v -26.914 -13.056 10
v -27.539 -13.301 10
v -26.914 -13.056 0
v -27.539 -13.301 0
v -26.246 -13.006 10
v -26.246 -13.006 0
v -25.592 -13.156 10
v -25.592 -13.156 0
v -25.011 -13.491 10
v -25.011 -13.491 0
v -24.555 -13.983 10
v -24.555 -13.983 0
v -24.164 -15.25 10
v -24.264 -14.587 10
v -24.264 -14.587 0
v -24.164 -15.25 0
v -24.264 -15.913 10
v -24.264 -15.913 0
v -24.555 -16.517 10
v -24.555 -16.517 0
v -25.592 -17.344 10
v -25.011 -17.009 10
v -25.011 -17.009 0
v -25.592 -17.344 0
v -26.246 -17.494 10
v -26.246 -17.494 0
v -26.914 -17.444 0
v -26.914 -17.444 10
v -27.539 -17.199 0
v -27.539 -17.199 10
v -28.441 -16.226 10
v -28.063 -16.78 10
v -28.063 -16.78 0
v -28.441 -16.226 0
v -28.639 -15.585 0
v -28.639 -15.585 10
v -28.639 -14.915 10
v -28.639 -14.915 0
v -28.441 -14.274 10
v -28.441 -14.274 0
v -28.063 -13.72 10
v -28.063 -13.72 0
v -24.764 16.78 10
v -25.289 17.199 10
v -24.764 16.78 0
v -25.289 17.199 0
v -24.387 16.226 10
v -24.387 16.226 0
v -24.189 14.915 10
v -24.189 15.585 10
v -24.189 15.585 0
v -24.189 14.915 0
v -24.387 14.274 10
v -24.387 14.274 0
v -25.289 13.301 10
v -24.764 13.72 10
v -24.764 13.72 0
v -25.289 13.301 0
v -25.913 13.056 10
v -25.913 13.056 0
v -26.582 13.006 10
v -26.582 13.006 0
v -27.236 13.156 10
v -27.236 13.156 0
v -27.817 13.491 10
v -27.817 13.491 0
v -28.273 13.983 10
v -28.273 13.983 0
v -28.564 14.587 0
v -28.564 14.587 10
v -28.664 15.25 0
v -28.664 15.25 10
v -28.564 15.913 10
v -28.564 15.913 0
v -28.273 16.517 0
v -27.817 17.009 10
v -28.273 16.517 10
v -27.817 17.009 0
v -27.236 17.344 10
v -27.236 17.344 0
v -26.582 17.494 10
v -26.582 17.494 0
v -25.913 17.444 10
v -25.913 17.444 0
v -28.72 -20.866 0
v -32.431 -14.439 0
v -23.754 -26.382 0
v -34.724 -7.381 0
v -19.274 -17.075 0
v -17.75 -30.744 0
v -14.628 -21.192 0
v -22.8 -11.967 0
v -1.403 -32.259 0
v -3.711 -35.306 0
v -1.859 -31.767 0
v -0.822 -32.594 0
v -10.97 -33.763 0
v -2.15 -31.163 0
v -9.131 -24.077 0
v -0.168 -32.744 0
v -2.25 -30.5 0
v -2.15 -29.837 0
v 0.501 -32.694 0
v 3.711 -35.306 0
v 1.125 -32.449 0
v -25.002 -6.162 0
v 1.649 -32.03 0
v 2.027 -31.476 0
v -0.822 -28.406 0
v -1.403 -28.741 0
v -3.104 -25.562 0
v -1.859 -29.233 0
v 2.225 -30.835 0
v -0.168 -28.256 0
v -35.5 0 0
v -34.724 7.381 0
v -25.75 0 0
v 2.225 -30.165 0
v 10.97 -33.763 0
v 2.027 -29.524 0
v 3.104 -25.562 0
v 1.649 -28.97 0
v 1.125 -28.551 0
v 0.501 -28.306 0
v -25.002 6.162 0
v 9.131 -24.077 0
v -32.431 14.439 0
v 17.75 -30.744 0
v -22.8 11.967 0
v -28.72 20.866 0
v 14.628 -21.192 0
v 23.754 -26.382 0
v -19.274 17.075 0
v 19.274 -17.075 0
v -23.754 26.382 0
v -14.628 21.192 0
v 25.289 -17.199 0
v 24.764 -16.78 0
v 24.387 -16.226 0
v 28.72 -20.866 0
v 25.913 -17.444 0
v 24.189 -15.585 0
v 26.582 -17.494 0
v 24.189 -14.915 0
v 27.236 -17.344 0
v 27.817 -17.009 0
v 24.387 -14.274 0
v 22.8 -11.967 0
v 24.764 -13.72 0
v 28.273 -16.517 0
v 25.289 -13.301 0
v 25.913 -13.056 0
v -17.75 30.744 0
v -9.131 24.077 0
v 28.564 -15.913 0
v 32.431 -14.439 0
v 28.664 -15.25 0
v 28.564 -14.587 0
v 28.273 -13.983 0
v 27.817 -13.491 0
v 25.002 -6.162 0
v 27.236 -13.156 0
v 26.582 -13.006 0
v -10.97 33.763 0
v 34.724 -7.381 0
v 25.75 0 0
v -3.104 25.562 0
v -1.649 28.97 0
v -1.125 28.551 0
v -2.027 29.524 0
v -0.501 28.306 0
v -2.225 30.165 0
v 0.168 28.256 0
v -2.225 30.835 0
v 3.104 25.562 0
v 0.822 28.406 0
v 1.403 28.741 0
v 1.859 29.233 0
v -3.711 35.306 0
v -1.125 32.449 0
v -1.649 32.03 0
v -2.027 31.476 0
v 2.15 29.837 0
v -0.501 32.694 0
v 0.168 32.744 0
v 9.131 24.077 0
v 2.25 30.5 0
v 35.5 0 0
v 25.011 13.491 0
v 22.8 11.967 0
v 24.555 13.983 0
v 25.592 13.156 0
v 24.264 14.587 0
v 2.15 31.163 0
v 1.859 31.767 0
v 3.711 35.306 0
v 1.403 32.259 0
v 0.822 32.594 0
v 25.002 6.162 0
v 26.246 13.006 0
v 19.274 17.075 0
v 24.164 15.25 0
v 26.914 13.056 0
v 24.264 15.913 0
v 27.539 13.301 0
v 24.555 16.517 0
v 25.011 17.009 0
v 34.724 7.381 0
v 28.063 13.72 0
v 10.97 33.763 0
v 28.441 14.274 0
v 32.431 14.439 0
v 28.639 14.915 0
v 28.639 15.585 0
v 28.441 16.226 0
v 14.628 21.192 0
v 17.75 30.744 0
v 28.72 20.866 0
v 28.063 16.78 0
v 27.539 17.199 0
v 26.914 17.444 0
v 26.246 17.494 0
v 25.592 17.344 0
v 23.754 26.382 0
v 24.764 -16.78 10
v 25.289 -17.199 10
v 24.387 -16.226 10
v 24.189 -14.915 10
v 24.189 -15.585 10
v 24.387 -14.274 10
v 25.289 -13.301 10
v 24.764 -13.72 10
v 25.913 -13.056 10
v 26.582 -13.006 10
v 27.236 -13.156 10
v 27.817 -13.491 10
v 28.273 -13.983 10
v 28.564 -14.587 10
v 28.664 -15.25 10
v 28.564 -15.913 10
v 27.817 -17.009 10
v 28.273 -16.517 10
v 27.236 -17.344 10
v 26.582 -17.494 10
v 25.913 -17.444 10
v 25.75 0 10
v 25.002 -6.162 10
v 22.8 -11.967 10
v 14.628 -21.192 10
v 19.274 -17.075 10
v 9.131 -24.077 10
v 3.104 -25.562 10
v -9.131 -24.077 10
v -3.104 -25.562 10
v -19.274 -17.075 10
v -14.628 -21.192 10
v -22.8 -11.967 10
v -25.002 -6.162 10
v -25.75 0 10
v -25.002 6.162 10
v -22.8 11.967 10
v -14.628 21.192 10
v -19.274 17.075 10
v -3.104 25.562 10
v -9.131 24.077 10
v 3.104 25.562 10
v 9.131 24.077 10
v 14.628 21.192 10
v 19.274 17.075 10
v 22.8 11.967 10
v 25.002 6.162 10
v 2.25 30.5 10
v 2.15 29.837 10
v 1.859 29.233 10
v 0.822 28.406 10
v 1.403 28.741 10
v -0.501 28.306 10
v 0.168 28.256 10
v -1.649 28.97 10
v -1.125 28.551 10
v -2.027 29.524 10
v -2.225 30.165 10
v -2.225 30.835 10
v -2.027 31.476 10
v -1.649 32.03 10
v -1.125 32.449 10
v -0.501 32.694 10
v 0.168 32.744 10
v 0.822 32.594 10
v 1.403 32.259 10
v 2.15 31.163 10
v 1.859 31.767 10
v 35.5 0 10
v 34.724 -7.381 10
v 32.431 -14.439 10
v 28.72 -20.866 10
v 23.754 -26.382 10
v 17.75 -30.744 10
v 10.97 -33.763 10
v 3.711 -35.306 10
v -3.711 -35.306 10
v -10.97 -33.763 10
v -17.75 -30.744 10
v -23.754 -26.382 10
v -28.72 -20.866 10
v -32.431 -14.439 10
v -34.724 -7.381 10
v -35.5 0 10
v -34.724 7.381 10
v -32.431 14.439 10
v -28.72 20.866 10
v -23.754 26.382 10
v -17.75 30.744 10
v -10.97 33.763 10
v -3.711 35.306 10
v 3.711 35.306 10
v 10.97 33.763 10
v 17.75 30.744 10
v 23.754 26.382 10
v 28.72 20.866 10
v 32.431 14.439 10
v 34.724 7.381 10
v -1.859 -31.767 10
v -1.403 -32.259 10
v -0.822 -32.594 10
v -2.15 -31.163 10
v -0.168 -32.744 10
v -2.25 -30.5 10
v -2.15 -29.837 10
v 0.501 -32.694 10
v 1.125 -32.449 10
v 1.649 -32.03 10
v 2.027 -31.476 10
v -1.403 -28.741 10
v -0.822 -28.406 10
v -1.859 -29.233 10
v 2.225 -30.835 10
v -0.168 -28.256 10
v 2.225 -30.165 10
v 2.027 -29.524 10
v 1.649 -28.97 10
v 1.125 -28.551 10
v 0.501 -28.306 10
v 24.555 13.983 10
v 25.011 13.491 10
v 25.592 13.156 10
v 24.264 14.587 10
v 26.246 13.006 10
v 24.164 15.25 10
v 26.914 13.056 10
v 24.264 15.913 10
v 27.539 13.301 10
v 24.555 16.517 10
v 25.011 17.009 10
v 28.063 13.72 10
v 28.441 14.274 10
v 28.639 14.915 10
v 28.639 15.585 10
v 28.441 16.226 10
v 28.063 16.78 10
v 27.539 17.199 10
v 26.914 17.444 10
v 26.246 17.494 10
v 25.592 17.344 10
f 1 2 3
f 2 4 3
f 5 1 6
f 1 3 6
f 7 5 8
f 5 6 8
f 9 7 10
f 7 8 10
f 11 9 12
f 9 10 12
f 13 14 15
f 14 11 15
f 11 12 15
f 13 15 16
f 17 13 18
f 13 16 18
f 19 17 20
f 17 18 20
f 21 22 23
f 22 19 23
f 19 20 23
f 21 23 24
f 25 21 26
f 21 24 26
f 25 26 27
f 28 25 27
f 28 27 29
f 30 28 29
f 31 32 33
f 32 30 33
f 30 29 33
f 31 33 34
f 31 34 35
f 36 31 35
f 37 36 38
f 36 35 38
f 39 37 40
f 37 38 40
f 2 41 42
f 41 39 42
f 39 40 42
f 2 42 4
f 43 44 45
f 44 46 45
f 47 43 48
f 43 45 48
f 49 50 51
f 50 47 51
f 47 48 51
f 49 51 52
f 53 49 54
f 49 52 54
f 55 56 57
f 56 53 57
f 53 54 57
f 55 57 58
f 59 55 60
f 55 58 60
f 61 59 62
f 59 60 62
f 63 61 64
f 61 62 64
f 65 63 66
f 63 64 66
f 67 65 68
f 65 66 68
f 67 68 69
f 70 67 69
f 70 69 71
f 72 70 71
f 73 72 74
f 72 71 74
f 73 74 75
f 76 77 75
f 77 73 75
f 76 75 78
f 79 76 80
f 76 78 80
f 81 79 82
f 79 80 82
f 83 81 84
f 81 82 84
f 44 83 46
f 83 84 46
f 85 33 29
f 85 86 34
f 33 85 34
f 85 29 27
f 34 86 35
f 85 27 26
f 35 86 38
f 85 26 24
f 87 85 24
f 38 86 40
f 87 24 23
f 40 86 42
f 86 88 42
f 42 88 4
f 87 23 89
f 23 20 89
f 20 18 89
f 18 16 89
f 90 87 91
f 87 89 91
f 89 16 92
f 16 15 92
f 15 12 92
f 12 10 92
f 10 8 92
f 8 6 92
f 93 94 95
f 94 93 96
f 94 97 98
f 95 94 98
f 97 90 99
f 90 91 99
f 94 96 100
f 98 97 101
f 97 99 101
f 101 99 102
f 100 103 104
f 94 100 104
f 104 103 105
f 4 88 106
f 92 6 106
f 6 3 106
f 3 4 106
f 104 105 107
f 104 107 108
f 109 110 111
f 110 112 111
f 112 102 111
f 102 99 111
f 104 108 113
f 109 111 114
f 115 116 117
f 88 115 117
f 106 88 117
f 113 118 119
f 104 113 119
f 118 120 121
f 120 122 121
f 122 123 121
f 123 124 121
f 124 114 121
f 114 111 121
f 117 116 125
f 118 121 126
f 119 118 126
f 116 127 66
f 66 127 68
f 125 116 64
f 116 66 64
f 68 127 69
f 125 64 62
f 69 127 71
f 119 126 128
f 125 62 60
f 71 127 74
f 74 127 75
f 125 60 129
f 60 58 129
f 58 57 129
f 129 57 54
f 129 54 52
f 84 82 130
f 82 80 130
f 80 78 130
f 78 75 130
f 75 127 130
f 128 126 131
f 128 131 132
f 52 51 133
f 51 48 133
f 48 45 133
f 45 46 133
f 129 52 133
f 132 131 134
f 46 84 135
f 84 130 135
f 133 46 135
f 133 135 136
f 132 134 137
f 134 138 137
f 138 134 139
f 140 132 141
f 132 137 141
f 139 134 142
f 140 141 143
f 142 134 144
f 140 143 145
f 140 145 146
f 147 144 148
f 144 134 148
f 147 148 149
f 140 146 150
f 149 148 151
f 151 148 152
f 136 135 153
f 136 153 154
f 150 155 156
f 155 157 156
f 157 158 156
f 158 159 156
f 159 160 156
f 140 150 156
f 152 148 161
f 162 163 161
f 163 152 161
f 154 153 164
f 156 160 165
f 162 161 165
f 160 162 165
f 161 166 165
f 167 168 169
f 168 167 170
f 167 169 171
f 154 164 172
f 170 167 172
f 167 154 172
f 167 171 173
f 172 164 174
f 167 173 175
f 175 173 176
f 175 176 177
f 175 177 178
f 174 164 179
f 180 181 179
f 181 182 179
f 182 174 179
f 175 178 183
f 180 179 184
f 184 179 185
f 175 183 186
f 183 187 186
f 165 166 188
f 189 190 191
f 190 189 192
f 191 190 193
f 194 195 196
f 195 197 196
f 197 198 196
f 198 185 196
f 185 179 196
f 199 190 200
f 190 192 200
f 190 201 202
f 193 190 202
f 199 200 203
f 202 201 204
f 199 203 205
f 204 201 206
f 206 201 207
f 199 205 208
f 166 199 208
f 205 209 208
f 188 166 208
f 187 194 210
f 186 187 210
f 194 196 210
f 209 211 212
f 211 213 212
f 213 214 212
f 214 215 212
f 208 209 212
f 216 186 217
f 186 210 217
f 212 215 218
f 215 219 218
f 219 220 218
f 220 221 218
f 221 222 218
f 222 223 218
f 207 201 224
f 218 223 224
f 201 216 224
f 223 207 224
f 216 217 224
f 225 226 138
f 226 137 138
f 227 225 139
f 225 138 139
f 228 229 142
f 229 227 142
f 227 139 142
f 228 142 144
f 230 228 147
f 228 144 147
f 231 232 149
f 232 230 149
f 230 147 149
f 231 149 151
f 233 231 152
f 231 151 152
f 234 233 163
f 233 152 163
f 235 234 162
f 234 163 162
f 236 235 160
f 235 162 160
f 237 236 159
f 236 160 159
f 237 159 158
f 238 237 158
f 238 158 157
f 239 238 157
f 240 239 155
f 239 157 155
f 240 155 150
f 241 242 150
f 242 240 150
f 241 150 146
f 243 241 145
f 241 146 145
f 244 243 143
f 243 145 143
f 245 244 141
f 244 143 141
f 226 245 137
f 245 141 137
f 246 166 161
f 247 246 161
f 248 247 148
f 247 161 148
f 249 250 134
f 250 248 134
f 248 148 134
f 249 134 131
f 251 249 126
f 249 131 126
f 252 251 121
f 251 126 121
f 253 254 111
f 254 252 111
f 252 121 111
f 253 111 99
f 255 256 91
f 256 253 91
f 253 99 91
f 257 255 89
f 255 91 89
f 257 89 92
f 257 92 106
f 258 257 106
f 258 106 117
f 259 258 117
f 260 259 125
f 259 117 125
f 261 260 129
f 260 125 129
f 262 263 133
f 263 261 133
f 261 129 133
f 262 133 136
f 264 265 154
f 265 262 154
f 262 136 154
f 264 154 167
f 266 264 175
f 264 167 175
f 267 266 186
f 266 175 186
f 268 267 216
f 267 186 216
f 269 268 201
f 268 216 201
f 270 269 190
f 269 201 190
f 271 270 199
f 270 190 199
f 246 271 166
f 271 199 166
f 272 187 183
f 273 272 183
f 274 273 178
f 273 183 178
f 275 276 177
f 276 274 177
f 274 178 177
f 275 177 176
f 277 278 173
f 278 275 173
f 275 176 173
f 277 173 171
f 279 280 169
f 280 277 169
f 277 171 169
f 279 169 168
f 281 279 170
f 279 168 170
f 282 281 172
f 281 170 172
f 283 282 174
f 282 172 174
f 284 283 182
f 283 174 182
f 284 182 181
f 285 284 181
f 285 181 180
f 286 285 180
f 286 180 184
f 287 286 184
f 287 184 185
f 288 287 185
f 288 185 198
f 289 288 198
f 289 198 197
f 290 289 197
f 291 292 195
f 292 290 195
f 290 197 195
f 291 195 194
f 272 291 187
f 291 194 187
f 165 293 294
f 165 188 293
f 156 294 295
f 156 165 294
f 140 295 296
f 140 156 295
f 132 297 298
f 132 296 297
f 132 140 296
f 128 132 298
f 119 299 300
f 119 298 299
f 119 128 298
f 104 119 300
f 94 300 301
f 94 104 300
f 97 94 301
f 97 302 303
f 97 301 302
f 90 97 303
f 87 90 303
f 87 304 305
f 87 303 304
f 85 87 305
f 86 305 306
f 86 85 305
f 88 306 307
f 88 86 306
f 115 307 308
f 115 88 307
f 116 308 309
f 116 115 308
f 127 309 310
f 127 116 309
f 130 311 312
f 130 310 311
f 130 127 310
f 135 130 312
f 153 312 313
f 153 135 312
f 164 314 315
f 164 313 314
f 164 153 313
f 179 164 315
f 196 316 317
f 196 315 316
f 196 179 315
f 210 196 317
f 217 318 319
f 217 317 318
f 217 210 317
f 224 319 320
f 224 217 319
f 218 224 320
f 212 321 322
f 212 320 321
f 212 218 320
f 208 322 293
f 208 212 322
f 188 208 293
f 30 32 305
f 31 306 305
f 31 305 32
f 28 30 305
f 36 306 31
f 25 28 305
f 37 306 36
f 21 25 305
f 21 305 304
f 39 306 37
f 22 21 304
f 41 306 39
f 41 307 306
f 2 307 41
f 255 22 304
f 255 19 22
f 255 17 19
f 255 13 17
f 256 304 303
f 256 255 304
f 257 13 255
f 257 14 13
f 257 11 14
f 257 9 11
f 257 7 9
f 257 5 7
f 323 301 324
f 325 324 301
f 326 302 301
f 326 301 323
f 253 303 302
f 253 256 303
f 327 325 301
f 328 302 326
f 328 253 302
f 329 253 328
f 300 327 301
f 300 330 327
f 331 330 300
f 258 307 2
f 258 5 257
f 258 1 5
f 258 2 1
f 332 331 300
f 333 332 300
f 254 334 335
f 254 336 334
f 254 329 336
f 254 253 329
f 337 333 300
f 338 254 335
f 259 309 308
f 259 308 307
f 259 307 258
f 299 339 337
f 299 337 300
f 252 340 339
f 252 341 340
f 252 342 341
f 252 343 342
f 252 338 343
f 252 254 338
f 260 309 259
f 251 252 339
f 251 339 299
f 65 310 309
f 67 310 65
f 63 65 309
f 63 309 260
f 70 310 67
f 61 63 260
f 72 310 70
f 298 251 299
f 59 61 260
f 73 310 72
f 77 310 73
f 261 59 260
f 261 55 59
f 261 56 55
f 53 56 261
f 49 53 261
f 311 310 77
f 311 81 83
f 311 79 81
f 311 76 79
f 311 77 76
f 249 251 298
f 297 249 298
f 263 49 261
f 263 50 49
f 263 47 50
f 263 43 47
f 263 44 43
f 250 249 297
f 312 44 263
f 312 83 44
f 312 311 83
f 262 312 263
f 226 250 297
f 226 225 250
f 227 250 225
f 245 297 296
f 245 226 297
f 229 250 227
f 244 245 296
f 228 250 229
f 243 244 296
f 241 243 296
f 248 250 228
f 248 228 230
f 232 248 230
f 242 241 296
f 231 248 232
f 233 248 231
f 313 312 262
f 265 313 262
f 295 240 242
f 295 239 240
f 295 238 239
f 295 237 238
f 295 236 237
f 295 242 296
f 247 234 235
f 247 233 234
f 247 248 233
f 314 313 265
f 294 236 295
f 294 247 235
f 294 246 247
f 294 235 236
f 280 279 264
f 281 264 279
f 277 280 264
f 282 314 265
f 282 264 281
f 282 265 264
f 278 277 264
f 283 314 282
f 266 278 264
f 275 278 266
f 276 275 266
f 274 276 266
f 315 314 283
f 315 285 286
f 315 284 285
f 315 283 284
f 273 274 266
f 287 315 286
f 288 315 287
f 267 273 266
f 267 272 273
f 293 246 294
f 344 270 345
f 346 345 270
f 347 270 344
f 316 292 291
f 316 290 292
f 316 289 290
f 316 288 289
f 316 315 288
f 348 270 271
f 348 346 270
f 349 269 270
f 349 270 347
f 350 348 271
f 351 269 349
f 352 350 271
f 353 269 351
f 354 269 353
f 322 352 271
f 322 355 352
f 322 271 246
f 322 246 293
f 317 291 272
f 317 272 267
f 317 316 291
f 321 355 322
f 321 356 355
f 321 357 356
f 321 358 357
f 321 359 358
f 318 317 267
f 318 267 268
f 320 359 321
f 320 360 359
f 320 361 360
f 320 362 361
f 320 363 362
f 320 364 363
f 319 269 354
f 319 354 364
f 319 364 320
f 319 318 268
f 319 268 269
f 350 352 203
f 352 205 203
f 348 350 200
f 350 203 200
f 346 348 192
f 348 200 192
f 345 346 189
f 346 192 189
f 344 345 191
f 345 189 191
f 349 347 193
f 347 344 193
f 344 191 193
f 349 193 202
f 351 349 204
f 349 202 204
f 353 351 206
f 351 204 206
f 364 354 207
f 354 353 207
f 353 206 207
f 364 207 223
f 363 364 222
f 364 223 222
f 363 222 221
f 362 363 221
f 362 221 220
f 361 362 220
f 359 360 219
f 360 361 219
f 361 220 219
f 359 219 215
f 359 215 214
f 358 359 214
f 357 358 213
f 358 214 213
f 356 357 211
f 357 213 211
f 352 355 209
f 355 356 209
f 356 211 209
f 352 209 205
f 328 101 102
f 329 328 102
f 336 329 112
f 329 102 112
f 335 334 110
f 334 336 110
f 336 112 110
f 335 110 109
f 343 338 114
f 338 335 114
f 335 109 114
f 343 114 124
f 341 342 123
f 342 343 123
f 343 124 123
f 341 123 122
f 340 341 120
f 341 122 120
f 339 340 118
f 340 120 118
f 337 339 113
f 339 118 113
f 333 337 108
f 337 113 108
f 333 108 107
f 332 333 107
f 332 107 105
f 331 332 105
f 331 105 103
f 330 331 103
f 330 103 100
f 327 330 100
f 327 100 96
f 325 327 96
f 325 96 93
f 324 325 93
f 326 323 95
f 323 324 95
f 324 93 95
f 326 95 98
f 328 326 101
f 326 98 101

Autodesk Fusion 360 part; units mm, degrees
sketch "Sketch17" plane through (0, 0, 0) normal (0, 0, 1) x (1, 0, 0)
  circle A0 centre (0, 0) radius 25.75
  circle A1 centre (0, 0) radius 35.5
  dimension "d61" = 51.5
  dimension "d62" = 71
extrude "Extrude10" add sketch "Sketch17" along normal blind 10
sketch "Sketch18" plane through (0, 0, 0) normal (0, 0, 1) x (1, 0, 0)
  point P0 (0, 30.5)
sketch "Sketch19" plane through (0, 0, 0) normal (0, 0, 1) x (1, 0, 0)
  circle A0 centre (0, 30.5) radius 2.25
  dimension "d65" = 4.5
extrude "Extrude11" cut sketch "Sketch19" along normal blind 10
pattern_circular "C-Pattern7" count 6 over 360 about axis through (0, 0, 0) along (0, 0, 1) of "Extrude11"
